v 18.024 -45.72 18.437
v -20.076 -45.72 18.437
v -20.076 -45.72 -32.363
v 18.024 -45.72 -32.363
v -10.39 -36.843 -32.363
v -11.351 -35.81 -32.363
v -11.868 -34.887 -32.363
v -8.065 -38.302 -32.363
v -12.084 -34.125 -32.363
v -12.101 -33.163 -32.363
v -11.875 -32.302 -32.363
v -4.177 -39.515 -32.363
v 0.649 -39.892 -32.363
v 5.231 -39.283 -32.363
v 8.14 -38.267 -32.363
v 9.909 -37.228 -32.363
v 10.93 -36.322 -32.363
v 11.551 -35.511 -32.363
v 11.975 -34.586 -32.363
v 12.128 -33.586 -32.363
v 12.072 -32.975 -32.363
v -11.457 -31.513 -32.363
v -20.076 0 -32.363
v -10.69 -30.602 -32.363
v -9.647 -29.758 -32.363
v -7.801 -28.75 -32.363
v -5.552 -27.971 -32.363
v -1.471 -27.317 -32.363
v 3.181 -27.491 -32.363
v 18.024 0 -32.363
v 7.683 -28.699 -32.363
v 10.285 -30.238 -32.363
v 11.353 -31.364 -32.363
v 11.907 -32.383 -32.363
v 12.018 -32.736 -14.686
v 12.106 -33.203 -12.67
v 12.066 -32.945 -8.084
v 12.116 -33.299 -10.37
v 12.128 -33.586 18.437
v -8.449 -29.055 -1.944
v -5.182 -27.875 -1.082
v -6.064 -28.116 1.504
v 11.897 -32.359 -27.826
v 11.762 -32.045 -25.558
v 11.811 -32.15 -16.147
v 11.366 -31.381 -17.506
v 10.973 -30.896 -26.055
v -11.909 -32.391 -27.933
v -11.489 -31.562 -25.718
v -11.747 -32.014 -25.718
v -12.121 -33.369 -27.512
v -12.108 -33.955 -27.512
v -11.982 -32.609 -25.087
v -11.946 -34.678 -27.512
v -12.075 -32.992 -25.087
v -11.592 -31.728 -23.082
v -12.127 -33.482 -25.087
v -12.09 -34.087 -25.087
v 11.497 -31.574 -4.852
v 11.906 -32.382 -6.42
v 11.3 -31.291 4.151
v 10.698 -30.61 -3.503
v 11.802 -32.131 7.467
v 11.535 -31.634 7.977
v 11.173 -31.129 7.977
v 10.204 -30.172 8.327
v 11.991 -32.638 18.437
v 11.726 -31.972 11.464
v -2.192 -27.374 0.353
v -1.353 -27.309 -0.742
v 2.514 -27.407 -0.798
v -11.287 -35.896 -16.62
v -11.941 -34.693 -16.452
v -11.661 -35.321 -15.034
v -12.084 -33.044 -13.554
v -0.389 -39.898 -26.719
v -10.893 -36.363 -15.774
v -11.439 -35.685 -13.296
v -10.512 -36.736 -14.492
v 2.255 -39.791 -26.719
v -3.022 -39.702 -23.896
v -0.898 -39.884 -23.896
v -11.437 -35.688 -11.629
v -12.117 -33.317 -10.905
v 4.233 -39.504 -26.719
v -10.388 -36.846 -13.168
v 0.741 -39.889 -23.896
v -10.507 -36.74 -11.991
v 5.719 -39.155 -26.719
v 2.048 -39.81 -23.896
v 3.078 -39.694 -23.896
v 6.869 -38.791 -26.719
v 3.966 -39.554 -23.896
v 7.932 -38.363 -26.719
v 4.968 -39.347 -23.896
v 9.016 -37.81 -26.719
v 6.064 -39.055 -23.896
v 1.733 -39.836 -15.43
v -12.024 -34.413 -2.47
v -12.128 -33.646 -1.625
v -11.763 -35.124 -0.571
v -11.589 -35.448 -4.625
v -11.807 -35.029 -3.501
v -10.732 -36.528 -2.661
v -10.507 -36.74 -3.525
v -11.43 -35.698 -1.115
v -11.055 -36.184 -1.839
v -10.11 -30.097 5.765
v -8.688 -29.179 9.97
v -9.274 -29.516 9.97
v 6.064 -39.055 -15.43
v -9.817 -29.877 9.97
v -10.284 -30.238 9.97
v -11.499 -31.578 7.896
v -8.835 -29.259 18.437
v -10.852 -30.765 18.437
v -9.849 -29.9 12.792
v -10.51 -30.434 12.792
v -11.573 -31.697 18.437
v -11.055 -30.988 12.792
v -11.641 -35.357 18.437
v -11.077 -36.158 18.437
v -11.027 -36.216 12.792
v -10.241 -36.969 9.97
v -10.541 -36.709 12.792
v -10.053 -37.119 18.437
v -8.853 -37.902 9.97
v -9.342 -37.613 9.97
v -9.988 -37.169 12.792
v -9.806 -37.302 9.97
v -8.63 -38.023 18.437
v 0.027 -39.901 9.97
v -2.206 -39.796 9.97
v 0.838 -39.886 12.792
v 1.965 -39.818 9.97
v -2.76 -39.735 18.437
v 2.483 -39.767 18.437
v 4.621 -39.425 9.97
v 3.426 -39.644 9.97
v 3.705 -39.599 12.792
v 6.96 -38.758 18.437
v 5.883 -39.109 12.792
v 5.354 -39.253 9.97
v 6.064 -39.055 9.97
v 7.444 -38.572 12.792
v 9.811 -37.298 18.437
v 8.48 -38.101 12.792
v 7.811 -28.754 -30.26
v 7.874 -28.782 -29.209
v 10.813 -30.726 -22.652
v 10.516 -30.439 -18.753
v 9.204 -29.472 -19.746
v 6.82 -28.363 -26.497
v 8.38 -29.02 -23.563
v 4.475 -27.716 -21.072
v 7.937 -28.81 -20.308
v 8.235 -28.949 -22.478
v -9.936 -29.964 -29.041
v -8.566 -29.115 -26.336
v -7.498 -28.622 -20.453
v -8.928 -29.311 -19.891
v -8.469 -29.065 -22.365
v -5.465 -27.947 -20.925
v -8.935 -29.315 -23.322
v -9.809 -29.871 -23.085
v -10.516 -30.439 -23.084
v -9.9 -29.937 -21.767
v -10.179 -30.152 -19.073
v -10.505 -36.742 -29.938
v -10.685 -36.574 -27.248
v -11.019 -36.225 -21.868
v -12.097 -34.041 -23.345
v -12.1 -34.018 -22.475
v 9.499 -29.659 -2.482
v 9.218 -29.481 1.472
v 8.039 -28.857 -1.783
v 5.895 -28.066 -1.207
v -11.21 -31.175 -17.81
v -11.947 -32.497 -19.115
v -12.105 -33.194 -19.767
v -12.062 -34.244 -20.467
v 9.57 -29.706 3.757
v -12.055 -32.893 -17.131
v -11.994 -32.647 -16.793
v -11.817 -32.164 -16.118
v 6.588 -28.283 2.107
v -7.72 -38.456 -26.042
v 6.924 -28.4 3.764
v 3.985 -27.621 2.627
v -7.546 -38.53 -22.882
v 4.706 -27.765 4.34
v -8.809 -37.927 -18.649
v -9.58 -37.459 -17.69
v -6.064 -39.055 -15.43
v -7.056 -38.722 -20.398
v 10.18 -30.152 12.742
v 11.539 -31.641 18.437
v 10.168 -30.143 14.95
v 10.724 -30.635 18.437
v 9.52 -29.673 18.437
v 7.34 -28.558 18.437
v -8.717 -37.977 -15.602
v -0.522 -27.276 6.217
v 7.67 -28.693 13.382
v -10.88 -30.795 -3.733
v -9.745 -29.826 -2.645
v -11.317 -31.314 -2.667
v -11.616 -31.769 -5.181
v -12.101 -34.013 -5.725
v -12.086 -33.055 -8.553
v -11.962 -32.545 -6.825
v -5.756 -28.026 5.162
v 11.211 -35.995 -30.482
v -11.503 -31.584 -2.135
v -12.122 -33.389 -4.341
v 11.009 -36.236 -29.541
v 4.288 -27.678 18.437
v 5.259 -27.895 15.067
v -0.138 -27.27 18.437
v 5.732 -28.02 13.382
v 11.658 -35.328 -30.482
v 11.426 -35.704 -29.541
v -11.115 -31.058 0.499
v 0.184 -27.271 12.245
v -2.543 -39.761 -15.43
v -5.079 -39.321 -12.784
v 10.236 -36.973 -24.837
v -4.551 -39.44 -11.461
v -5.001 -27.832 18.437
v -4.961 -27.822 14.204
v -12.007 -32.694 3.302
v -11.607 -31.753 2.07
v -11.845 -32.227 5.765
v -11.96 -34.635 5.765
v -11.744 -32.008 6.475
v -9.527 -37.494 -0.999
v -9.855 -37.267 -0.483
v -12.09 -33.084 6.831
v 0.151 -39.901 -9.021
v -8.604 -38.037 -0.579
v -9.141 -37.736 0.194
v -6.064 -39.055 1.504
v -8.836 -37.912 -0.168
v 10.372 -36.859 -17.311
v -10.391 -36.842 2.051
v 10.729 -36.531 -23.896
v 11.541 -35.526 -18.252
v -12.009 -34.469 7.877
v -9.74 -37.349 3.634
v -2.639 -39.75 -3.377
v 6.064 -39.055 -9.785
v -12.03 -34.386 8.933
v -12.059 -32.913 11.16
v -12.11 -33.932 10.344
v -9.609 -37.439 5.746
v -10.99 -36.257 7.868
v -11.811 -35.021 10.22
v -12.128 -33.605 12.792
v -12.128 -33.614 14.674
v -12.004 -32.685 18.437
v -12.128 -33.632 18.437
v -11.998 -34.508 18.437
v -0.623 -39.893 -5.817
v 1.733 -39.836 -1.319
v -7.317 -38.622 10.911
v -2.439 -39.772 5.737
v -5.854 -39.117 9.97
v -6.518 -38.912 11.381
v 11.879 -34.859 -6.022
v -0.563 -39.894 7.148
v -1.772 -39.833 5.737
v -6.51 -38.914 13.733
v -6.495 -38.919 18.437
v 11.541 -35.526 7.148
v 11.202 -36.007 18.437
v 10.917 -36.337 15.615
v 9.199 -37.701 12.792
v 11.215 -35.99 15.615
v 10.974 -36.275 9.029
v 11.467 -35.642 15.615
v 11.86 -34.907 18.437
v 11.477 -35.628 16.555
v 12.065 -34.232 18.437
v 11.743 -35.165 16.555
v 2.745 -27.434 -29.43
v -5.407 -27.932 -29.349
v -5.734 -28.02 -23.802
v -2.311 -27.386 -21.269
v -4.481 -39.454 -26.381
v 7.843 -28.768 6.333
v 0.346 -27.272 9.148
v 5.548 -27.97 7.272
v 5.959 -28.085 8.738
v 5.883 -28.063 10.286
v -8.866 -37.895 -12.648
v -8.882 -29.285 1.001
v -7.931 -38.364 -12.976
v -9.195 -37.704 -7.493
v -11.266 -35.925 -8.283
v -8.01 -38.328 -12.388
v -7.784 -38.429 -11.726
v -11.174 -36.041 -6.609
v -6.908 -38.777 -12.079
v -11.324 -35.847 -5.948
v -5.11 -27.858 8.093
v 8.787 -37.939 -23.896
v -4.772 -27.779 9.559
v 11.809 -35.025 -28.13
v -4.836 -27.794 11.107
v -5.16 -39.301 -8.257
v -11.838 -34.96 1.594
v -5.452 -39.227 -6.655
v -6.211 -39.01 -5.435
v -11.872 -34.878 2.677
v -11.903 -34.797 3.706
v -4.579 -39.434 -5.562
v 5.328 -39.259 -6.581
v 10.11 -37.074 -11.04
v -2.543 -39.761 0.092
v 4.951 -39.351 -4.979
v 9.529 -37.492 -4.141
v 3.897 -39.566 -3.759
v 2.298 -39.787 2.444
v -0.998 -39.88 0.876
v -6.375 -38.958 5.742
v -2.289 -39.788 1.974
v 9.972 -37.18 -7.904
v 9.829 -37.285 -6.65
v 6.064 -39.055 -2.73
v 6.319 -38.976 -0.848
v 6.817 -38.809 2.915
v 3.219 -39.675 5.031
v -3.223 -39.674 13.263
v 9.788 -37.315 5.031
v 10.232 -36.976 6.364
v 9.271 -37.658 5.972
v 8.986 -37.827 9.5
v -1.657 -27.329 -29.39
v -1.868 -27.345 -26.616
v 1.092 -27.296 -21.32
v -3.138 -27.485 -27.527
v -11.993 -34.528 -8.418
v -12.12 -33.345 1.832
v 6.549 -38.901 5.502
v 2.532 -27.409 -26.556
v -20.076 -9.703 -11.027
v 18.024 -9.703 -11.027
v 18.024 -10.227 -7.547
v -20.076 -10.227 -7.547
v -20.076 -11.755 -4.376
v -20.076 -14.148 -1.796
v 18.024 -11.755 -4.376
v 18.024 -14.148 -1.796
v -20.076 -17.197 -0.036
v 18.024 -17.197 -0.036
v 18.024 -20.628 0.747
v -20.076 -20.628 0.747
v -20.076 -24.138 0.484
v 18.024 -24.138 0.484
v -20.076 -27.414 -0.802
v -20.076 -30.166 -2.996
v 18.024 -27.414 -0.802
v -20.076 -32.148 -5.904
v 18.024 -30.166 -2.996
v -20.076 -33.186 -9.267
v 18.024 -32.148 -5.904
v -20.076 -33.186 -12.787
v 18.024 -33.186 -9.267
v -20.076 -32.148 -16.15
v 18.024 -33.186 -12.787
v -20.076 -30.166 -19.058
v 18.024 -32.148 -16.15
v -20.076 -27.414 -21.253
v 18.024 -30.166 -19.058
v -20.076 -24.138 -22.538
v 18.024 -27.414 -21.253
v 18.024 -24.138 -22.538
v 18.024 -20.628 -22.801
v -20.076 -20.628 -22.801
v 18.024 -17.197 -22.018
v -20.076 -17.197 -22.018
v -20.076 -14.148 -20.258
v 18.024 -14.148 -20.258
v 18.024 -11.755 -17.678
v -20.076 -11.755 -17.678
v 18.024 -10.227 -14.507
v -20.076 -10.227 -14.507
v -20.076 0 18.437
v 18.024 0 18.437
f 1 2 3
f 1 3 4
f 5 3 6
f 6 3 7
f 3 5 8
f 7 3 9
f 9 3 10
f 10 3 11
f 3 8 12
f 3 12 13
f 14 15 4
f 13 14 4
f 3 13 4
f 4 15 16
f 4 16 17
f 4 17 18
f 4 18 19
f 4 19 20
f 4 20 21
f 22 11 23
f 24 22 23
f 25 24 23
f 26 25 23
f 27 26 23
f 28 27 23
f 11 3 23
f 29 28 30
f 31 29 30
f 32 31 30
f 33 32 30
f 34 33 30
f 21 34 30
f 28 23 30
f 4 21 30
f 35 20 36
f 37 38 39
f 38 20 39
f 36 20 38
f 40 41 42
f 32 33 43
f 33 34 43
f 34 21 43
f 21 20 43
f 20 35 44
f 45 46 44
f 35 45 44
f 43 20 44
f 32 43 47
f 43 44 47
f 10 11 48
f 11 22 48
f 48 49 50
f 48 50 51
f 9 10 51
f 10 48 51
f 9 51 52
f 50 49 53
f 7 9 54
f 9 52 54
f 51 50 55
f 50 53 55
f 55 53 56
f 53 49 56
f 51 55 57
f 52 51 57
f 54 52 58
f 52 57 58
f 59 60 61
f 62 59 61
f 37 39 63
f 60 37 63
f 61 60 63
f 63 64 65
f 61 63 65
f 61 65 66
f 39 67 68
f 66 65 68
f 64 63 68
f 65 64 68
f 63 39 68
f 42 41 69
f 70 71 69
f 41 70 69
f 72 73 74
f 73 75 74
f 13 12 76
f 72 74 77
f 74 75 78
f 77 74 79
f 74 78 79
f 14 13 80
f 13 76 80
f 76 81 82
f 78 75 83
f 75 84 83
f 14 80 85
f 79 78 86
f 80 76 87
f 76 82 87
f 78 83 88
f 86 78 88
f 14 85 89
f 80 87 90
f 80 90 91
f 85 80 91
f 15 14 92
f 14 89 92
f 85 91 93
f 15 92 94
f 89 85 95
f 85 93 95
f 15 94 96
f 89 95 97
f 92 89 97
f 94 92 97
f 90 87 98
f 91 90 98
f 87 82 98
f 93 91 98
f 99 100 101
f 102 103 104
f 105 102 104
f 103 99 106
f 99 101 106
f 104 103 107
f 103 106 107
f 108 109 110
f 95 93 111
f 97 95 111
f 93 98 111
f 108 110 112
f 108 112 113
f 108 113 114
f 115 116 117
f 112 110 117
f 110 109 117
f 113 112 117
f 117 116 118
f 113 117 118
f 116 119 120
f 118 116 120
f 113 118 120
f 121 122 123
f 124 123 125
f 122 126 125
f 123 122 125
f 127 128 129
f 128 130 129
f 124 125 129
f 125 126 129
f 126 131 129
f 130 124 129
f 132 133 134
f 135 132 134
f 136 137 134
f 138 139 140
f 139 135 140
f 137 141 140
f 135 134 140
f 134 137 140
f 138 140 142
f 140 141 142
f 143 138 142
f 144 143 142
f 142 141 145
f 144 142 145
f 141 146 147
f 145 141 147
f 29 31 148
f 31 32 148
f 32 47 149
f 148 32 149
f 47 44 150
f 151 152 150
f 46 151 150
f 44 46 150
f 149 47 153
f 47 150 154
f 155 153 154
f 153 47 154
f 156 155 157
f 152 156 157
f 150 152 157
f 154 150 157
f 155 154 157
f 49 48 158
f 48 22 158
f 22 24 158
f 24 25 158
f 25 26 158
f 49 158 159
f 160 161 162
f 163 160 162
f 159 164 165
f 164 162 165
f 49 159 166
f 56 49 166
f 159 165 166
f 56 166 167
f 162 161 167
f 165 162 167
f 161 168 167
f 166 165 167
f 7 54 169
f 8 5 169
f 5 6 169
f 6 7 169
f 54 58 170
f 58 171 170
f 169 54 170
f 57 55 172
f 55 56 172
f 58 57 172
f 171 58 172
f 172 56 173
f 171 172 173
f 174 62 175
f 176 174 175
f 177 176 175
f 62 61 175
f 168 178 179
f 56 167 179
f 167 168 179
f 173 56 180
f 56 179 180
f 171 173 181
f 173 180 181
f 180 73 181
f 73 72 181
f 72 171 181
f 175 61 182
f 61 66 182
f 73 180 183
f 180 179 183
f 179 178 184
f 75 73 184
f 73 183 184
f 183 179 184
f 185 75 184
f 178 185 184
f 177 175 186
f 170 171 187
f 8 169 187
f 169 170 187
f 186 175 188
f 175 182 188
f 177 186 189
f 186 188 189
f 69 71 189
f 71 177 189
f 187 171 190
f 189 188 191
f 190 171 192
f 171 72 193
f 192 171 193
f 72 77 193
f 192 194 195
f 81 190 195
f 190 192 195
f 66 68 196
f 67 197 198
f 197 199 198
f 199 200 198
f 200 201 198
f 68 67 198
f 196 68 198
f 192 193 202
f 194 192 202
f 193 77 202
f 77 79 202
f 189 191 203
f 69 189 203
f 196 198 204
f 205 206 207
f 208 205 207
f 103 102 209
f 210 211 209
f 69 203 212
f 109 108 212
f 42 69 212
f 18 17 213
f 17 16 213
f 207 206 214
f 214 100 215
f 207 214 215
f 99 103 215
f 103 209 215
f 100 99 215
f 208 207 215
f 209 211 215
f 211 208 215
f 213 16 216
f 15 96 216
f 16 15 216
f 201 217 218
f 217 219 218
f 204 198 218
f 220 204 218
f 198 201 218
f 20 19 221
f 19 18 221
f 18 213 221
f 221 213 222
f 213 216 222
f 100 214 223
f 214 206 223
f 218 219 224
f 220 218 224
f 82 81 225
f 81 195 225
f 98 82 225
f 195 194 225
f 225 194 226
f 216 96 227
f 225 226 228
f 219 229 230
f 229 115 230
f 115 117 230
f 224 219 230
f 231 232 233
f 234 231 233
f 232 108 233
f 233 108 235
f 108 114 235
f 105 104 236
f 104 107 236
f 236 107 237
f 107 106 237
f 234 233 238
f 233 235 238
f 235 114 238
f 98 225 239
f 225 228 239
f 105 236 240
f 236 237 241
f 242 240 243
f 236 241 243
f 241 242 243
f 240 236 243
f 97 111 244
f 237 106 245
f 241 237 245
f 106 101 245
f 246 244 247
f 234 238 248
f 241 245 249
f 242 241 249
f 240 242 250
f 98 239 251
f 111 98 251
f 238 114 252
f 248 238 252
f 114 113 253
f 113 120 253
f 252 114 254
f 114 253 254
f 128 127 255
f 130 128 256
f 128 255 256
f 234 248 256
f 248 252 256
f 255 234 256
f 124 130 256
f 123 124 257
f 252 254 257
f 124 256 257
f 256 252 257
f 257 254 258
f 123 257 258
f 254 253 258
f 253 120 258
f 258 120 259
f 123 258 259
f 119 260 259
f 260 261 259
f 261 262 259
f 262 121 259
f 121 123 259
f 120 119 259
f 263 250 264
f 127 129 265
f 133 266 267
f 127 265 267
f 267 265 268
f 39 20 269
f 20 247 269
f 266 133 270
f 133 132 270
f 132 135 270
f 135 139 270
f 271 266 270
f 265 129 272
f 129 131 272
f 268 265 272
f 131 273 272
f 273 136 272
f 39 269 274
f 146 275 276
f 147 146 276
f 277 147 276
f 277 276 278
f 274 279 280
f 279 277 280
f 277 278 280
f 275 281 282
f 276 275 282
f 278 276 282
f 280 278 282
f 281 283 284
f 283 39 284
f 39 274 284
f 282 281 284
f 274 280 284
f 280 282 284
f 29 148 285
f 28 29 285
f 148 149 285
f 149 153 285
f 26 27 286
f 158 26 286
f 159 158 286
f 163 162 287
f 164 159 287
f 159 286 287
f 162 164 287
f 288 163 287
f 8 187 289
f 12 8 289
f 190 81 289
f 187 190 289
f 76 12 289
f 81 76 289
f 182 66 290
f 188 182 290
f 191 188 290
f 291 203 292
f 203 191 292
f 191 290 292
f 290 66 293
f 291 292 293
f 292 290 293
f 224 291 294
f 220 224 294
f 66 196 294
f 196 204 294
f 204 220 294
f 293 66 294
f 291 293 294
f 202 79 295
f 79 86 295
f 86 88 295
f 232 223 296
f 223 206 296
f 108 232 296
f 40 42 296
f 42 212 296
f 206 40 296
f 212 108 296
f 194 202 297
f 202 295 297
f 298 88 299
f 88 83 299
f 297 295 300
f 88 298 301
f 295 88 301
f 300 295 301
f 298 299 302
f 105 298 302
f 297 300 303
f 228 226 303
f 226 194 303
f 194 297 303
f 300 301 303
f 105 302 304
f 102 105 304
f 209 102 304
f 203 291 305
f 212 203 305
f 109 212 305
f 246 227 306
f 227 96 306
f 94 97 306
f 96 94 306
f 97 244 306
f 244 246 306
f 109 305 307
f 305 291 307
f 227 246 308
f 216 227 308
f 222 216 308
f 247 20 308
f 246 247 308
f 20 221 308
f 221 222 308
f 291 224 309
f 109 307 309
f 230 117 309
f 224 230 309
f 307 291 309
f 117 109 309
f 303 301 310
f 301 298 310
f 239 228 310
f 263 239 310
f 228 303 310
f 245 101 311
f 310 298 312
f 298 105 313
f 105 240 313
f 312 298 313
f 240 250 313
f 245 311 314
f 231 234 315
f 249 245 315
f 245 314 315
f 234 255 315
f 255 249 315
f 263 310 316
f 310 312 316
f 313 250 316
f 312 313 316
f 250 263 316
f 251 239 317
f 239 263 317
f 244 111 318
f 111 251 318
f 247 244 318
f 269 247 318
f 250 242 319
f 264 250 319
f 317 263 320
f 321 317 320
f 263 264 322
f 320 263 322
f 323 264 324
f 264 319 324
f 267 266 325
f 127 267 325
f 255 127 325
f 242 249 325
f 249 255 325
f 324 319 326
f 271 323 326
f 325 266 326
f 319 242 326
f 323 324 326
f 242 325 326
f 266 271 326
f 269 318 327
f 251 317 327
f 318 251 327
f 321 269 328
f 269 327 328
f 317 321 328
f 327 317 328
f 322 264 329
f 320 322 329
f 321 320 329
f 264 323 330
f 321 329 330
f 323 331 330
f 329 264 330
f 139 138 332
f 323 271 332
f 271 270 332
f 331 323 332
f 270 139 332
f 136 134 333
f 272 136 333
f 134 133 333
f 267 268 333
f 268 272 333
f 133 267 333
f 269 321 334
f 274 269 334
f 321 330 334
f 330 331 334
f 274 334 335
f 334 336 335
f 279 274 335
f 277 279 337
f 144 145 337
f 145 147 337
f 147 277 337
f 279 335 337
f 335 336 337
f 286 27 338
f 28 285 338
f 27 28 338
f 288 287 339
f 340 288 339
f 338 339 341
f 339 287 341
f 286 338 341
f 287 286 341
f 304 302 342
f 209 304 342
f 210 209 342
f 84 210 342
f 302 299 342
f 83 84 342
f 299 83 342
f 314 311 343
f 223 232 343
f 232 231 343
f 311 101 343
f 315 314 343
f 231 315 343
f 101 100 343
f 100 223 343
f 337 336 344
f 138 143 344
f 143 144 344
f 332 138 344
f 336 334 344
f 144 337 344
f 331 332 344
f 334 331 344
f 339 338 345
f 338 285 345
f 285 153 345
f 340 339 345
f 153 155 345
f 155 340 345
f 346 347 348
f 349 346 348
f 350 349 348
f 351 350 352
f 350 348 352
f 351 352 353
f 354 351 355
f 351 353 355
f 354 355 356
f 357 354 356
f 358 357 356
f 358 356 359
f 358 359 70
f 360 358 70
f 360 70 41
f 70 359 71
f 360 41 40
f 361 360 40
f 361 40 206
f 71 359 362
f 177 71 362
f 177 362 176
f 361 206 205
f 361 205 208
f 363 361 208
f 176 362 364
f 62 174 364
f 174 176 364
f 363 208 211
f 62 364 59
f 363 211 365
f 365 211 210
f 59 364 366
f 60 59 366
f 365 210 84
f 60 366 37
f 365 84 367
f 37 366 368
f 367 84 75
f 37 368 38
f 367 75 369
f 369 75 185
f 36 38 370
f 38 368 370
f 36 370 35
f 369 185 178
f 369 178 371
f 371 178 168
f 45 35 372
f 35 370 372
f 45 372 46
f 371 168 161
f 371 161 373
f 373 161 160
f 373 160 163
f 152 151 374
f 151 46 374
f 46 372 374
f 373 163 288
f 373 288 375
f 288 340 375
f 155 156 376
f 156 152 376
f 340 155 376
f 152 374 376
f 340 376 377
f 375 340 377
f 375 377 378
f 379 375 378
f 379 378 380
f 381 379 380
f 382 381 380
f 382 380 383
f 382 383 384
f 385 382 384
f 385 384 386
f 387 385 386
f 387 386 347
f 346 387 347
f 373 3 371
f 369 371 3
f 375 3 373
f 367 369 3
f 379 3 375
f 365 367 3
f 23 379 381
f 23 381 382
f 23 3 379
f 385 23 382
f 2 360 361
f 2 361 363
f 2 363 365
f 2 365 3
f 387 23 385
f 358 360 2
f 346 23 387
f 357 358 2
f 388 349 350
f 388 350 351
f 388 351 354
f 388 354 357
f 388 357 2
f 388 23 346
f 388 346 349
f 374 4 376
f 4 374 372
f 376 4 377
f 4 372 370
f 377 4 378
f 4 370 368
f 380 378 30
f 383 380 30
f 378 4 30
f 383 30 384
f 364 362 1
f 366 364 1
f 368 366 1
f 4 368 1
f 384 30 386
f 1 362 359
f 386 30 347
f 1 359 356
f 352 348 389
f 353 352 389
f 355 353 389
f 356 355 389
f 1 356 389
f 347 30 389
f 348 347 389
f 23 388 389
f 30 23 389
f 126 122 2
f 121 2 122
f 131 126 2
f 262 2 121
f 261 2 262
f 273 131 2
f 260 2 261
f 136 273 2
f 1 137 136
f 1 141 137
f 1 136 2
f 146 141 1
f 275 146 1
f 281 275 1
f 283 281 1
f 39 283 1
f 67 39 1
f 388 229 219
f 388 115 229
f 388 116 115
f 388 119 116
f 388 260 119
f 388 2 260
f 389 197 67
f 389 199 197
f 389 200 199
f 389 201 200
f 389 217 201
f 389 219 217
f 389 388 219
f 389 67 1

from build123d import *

# Parameters (mm, degrees)
F0_W     = 38.1
F0_H     = 50.8
F1_DEPTH = 45.72
F4_DEPTH = 71.12
F5_R     = 11.807357
F6_DEPTH = 90.17


with BuildPart() as f1:
    # F0 (on Front) → F1 (new body)
    with BuildSketch(Plane.XZ):
        with Locations((-1.025561, -6.963143)):
            Rectangle(F0_W, F0_H)
    extrude(amount=F1_DEPTH)

    # F3 (on face) → F4 (cut)
    with BuildSketch(Plane.XY.offset(18.436857)):
        with BuildLine():
            add(Edge.make_bspline(
                [(12.12835, -33.585556), (12.12835, -22.646572), (-6.064175, -28.116064), (-24.256701, -33.585556), (-6.064175, -39.055048), (12.12835, -44.524539), (12.12835, -33.585556)],
                knots=[0, 0, 0, 2.094395, 2.094395, 4.18879, 4.18879, 6.283185, 6.283185, 6.283185], degree=2, weights=[1, 0.5, 1, 0.5, 1, 0.5, 1]))
        make_face()
    extrude(amount=-F4_DEPTH, mode=Mode.SUBTRACT)

    # F5 (on face) → F6 (cut)
    with BuildSketch(Plane.YZ.offset(18.024439)):
        with Locations((-21.510221, -11.027101)):
            Circle(F5_R)
    extrude(amount=-F6_DEPTH, mode=Mode.SUBTRACT)


solid = f1.part
